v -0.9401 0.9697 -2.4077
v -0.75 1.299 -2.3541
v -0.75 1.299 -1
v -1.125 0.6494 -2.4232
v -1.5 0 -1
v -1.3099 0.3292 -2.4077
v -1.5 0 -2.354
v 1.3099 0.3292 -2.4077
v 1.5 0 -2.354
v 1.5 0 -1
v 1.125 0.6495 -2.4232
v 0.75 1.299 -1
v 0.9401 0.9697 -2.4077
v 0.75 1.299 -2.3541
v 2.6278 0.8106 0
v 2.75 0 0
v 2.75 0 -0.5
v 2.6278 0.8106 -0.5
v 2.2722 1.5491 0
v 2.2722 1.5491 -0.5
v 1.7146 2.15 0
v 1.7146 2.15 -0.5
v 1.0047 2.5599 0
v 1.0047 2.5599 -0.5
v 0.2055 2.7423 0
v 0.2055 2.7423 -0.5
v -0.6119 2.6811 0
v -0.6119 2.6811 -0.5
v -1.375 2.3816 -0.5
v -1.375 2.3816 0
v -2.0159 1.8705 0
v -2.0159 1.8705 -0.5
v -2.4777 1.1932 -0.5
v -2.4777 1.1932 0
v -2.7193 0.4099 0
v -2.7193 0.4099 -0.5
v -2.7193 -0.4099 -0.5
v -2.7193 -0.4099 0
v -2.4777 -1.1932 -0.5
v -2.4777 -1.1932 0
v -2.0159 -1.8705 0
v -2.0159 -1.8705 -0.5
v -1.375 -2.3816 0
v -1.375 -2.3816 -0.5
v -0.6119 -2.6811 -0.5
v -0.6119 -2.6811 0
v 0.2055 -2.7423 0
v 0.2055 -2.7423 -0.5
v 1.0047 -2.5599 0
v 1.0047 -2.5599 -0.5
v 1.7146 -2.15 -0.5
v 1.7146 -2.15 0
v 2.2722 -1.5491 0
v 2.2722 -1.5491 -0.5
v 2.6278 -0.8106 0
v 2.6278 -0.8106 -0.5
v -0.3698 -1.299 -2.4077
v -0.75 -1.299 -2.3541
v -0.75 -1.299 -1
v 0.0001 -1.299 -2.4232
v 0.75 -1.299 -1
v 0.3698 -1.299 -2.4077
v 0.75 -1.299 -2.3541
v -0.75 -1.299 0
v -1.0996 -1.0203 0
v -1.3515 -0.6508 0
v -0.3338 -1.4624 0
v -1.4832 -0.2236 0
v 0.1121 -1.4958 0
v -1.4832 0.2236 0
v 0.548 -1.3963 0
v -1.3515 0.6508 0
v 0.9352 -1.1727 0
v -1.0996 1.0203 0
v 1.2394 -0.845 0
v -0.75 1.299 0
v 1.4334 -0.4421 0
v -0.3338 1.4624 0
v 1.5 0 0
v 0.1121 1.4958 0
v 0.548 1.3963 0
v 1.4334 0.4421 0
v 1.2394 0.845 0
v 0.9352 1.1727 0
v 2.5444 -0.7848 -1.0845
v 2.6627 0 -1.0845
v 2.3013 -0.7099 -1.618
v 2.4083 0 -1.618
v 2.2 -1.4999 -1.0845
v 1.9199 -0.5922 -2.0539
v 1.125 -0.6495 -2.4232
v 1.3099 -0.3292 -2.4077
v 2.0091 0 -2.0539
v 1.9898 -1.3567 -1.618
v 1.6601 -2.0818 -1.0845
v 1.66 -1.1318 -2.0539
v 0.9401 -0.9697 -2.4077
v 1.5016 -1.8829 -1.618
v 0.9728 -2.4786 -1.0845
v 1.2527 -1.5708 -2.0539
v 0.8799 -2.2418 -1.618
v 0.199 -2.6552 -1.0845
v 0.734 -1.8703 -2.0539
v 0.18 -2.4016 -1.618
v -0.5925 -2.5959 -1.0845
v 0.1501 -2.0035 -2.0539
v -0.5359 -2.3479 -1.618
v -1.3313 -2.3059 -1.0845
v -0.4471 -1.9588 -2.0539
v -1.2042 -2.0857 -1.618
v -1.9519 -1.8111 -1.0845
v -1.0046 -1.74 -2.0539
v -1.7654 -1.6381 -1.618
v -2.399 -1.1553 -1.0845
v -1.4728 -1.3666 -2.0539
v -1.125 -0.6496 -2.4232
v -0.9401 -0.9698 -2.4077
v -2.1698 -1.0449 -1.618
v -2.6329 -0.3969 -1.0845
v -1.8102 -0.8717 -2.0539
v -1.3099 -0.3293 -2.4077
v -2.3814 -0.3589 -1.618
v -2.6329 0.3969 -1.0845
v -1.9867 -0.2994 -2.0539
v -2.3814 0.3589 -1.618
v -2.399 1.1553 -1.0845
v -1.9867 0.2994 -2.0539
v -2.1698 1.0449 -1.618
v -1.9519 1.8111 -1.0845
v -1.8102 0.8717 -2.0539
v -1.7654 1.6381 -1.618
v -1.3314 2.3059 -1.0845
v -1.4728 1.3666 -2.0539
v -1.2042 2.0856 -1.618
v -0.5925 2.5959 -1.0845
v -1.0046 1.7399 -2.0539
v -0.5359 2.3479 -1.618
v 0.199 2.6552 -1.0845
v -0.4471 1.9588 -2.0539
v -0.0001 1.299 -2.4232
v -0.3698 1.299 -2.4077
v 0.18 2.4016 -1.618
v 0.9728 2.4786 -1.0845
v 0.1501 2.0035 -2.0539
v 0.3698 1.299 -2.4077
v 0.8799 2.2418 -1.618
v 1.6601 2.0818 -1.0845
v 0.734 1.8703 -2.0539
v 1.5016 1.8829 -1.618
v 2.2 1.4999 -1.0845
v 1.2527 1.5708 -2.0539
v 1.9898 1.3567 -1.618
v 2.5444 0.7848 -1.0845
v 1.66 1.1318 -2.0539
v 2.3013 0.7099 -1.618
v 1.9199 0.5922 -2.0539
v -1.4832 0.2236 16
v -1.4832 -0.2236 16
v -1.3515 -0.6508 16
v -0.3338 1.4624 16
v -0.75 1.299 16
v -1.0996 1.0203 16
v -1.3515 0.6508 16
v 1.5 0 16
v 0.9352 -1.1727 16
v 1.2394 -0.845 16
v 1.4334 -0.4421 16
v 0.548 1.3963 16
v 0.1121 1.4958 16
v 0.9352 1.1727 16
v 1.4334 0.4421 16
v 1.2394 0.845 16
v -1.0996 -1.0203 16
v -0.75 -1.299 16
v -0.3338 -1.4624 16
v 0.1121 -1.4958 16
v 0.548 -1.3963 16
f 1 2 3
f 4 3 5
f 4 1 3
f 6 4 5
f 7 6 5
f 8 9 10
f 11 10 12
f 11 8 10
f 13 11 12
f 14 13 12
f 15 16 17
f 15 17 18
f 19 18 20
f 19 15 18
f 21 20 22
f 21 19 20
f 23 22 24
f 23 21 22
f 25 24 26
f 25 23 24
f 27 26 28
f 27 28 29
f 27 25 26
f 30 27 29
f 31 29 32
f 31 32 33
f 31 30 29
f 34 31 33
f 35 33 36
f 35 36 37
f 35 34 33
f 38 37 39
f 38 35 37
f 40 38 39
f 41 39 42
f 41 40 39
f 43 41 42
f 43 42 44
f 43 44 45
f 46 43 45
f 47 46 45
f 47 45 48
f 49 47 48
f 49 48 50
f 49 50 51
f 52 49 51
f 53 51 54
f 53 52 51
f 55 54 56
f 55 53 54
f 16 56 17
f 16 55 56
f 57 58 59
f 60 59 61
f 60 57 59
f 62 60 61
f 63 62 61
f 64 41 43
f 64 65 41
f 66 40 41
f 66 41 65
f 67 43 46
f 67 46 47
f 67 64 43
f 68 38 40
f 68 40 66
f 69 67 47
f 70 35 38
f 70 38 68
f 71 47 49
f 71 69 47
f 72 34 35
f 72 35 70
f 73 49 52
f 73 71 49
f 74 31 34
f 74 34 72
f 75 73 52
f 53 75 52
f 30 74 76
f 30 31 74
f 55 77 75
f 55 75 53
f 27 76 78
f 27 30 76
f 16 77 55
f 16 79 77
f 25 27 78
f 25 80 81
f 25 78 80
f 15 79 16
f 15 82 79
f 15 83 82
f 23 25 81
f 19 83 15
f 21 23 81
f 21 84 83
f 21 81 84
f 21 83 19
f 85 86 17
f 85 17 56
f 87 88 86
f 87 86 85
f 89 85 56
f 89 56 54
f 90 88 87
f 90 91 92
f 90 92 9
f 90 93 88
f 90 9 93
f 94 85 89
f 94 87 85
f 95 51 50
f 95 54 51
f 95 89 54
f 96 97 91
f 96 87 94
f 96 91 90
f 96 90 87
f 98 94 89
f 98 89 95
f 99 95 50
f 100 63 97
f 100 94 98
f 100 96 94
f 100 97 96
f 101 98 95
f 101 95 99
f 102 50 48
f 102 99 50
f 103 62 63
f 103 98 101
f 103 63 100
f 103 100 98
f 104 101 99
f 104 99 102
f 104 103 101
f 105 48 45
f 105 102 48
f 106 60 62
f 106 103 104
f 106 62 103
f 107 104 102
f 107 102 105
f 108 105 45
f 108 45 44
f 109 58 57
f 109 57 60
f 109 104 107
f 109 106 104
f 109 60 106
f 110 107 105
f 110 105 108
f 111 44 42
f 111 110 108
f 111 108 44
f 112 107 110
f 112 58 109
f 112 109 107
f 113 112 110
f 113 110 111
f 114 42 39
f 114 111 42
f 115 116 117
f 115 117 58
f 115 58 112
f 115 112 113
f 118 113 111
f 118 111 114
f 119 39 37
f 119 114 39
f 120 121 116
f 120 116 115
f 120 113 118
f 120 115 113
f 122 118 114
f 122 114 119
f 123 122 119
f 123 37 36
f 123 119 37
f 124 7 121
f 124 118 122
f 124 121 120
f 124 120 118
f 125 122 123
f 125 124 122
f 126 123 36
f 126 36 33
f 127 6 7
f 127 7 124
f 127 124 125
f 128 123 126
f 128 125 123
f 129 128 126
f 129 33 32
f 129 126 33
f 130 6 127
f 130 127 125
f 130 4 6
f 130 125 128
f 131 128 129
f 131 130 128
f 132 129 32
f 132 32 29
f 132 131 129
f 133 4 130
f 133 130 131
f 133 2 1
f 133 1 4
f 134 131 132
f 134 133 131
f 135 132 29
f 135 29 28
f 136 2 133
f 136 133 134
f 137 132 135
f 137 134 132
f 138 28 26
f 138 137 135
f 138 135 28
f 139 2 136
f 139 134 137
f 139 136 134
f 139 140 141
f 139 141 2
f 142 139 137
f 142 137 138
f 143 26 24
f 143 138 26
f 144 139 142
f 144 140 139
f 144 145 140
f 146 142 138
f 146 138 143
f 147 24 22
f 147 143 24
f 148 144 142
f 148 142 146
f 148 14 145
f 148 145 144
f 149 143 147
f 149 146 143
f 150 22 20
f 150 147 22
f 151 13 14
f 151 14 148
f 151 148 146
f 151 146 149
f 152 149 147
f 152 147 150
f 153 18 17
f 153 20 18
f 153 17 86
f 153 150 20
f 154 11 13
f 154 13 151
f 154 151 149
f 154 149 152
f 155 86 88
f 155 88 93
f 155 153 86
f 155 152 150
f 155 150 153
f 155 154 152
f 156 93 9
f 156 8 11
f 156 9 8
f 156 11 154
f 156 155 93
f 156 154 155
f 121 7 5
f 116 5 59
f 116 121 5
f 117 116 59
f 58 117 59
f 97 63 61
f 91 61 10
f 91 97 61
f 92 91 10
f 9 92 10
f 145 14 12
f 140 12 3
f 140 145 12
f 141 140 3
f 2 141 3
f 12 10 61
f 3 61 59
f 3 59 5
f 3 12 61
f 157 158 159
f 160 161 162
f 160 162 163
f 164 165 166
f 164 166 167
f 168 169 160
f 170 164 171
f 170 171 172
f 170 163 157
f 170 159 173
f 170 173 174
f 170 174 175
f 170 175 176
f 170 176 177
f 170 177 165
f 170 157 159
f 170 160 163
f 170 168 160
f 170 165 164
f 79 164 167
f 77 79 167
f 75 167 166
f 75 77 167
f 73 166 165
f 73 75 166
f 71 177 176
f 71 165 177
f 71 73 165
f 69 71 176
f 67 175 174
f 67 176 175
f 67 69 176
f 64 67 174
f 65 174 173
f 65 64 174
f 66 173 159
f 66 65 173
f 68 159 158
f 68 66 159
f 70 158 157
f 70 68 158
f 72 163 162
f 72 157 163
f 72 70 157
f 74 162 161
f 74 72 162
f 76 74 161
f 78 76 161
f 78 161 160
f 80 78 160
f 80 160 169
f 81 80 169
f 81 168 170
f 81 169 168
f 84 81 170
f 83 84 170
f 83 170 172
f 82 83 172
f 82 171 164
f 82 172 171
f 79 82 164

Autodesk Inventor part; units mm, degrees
ref_plane "YZ Plane" through (0, 0, 0) normal (1, 0, 0) x (0, 1, 0)
ref_plane "XZ Plane" through (0, 0, 0) normal (0, 1, 0) x (-1, 0, 0)
ref_plane "XY Plane" through (0, 0, 0) normal (0, 0, 1) x (1, 0, 0)
sketch "Boceto1" plane through (0, 0, 0) normal (0, 0, 1) x (1, 0, 0)
  circle A0 centre (0, 0) radius 1.5
  circle A1 centre (0, 0) radius 2.75
  dimension "d0" = 3
  dimension "d1" = 5.5
extrude "Extrusión1" add sketch "Boceto1" along normal blind 16 contours A0
extrude "Extrusión2" add sketch "Boceto1" against normal blind 2.5 contours A0 | A1
sketch "Boceto2" plane through (0, 0, -2.5) normal (0, 0, -1) x (-1, 0, 0)
  line L0 (1.5, 0) -> (0.75, -1.299)
  line L1 (0.75, -1.299) -> (-0.75, -1.299)
  line L2 (-0.75, -1.299) -> (-1.5, 0)
  line L3 (-1.5, 0) -> (-0.75, 1.299)
  line L4 (-0.75, 1.299) -> (0.75, 1.299)
  line L5 (0.75, 1.299) -> (1.5, 0)
  point P0 (0, 0)
  point P1 (0, 0)
  dimension "d6" = 3
fillet "Empalme1" radius 2 1 edges at (-2.75, 0, -2.5)
extrude "Extrusión4" cut sketch "Boceto2" against normal blind 1.5
thread "Rosca1" size "M3x0.5" class "6g" standard "ANSI Metric M Profile" full length
properties part number "tonrilloM3x16mm" material "Acero inoxidable, 440C"
